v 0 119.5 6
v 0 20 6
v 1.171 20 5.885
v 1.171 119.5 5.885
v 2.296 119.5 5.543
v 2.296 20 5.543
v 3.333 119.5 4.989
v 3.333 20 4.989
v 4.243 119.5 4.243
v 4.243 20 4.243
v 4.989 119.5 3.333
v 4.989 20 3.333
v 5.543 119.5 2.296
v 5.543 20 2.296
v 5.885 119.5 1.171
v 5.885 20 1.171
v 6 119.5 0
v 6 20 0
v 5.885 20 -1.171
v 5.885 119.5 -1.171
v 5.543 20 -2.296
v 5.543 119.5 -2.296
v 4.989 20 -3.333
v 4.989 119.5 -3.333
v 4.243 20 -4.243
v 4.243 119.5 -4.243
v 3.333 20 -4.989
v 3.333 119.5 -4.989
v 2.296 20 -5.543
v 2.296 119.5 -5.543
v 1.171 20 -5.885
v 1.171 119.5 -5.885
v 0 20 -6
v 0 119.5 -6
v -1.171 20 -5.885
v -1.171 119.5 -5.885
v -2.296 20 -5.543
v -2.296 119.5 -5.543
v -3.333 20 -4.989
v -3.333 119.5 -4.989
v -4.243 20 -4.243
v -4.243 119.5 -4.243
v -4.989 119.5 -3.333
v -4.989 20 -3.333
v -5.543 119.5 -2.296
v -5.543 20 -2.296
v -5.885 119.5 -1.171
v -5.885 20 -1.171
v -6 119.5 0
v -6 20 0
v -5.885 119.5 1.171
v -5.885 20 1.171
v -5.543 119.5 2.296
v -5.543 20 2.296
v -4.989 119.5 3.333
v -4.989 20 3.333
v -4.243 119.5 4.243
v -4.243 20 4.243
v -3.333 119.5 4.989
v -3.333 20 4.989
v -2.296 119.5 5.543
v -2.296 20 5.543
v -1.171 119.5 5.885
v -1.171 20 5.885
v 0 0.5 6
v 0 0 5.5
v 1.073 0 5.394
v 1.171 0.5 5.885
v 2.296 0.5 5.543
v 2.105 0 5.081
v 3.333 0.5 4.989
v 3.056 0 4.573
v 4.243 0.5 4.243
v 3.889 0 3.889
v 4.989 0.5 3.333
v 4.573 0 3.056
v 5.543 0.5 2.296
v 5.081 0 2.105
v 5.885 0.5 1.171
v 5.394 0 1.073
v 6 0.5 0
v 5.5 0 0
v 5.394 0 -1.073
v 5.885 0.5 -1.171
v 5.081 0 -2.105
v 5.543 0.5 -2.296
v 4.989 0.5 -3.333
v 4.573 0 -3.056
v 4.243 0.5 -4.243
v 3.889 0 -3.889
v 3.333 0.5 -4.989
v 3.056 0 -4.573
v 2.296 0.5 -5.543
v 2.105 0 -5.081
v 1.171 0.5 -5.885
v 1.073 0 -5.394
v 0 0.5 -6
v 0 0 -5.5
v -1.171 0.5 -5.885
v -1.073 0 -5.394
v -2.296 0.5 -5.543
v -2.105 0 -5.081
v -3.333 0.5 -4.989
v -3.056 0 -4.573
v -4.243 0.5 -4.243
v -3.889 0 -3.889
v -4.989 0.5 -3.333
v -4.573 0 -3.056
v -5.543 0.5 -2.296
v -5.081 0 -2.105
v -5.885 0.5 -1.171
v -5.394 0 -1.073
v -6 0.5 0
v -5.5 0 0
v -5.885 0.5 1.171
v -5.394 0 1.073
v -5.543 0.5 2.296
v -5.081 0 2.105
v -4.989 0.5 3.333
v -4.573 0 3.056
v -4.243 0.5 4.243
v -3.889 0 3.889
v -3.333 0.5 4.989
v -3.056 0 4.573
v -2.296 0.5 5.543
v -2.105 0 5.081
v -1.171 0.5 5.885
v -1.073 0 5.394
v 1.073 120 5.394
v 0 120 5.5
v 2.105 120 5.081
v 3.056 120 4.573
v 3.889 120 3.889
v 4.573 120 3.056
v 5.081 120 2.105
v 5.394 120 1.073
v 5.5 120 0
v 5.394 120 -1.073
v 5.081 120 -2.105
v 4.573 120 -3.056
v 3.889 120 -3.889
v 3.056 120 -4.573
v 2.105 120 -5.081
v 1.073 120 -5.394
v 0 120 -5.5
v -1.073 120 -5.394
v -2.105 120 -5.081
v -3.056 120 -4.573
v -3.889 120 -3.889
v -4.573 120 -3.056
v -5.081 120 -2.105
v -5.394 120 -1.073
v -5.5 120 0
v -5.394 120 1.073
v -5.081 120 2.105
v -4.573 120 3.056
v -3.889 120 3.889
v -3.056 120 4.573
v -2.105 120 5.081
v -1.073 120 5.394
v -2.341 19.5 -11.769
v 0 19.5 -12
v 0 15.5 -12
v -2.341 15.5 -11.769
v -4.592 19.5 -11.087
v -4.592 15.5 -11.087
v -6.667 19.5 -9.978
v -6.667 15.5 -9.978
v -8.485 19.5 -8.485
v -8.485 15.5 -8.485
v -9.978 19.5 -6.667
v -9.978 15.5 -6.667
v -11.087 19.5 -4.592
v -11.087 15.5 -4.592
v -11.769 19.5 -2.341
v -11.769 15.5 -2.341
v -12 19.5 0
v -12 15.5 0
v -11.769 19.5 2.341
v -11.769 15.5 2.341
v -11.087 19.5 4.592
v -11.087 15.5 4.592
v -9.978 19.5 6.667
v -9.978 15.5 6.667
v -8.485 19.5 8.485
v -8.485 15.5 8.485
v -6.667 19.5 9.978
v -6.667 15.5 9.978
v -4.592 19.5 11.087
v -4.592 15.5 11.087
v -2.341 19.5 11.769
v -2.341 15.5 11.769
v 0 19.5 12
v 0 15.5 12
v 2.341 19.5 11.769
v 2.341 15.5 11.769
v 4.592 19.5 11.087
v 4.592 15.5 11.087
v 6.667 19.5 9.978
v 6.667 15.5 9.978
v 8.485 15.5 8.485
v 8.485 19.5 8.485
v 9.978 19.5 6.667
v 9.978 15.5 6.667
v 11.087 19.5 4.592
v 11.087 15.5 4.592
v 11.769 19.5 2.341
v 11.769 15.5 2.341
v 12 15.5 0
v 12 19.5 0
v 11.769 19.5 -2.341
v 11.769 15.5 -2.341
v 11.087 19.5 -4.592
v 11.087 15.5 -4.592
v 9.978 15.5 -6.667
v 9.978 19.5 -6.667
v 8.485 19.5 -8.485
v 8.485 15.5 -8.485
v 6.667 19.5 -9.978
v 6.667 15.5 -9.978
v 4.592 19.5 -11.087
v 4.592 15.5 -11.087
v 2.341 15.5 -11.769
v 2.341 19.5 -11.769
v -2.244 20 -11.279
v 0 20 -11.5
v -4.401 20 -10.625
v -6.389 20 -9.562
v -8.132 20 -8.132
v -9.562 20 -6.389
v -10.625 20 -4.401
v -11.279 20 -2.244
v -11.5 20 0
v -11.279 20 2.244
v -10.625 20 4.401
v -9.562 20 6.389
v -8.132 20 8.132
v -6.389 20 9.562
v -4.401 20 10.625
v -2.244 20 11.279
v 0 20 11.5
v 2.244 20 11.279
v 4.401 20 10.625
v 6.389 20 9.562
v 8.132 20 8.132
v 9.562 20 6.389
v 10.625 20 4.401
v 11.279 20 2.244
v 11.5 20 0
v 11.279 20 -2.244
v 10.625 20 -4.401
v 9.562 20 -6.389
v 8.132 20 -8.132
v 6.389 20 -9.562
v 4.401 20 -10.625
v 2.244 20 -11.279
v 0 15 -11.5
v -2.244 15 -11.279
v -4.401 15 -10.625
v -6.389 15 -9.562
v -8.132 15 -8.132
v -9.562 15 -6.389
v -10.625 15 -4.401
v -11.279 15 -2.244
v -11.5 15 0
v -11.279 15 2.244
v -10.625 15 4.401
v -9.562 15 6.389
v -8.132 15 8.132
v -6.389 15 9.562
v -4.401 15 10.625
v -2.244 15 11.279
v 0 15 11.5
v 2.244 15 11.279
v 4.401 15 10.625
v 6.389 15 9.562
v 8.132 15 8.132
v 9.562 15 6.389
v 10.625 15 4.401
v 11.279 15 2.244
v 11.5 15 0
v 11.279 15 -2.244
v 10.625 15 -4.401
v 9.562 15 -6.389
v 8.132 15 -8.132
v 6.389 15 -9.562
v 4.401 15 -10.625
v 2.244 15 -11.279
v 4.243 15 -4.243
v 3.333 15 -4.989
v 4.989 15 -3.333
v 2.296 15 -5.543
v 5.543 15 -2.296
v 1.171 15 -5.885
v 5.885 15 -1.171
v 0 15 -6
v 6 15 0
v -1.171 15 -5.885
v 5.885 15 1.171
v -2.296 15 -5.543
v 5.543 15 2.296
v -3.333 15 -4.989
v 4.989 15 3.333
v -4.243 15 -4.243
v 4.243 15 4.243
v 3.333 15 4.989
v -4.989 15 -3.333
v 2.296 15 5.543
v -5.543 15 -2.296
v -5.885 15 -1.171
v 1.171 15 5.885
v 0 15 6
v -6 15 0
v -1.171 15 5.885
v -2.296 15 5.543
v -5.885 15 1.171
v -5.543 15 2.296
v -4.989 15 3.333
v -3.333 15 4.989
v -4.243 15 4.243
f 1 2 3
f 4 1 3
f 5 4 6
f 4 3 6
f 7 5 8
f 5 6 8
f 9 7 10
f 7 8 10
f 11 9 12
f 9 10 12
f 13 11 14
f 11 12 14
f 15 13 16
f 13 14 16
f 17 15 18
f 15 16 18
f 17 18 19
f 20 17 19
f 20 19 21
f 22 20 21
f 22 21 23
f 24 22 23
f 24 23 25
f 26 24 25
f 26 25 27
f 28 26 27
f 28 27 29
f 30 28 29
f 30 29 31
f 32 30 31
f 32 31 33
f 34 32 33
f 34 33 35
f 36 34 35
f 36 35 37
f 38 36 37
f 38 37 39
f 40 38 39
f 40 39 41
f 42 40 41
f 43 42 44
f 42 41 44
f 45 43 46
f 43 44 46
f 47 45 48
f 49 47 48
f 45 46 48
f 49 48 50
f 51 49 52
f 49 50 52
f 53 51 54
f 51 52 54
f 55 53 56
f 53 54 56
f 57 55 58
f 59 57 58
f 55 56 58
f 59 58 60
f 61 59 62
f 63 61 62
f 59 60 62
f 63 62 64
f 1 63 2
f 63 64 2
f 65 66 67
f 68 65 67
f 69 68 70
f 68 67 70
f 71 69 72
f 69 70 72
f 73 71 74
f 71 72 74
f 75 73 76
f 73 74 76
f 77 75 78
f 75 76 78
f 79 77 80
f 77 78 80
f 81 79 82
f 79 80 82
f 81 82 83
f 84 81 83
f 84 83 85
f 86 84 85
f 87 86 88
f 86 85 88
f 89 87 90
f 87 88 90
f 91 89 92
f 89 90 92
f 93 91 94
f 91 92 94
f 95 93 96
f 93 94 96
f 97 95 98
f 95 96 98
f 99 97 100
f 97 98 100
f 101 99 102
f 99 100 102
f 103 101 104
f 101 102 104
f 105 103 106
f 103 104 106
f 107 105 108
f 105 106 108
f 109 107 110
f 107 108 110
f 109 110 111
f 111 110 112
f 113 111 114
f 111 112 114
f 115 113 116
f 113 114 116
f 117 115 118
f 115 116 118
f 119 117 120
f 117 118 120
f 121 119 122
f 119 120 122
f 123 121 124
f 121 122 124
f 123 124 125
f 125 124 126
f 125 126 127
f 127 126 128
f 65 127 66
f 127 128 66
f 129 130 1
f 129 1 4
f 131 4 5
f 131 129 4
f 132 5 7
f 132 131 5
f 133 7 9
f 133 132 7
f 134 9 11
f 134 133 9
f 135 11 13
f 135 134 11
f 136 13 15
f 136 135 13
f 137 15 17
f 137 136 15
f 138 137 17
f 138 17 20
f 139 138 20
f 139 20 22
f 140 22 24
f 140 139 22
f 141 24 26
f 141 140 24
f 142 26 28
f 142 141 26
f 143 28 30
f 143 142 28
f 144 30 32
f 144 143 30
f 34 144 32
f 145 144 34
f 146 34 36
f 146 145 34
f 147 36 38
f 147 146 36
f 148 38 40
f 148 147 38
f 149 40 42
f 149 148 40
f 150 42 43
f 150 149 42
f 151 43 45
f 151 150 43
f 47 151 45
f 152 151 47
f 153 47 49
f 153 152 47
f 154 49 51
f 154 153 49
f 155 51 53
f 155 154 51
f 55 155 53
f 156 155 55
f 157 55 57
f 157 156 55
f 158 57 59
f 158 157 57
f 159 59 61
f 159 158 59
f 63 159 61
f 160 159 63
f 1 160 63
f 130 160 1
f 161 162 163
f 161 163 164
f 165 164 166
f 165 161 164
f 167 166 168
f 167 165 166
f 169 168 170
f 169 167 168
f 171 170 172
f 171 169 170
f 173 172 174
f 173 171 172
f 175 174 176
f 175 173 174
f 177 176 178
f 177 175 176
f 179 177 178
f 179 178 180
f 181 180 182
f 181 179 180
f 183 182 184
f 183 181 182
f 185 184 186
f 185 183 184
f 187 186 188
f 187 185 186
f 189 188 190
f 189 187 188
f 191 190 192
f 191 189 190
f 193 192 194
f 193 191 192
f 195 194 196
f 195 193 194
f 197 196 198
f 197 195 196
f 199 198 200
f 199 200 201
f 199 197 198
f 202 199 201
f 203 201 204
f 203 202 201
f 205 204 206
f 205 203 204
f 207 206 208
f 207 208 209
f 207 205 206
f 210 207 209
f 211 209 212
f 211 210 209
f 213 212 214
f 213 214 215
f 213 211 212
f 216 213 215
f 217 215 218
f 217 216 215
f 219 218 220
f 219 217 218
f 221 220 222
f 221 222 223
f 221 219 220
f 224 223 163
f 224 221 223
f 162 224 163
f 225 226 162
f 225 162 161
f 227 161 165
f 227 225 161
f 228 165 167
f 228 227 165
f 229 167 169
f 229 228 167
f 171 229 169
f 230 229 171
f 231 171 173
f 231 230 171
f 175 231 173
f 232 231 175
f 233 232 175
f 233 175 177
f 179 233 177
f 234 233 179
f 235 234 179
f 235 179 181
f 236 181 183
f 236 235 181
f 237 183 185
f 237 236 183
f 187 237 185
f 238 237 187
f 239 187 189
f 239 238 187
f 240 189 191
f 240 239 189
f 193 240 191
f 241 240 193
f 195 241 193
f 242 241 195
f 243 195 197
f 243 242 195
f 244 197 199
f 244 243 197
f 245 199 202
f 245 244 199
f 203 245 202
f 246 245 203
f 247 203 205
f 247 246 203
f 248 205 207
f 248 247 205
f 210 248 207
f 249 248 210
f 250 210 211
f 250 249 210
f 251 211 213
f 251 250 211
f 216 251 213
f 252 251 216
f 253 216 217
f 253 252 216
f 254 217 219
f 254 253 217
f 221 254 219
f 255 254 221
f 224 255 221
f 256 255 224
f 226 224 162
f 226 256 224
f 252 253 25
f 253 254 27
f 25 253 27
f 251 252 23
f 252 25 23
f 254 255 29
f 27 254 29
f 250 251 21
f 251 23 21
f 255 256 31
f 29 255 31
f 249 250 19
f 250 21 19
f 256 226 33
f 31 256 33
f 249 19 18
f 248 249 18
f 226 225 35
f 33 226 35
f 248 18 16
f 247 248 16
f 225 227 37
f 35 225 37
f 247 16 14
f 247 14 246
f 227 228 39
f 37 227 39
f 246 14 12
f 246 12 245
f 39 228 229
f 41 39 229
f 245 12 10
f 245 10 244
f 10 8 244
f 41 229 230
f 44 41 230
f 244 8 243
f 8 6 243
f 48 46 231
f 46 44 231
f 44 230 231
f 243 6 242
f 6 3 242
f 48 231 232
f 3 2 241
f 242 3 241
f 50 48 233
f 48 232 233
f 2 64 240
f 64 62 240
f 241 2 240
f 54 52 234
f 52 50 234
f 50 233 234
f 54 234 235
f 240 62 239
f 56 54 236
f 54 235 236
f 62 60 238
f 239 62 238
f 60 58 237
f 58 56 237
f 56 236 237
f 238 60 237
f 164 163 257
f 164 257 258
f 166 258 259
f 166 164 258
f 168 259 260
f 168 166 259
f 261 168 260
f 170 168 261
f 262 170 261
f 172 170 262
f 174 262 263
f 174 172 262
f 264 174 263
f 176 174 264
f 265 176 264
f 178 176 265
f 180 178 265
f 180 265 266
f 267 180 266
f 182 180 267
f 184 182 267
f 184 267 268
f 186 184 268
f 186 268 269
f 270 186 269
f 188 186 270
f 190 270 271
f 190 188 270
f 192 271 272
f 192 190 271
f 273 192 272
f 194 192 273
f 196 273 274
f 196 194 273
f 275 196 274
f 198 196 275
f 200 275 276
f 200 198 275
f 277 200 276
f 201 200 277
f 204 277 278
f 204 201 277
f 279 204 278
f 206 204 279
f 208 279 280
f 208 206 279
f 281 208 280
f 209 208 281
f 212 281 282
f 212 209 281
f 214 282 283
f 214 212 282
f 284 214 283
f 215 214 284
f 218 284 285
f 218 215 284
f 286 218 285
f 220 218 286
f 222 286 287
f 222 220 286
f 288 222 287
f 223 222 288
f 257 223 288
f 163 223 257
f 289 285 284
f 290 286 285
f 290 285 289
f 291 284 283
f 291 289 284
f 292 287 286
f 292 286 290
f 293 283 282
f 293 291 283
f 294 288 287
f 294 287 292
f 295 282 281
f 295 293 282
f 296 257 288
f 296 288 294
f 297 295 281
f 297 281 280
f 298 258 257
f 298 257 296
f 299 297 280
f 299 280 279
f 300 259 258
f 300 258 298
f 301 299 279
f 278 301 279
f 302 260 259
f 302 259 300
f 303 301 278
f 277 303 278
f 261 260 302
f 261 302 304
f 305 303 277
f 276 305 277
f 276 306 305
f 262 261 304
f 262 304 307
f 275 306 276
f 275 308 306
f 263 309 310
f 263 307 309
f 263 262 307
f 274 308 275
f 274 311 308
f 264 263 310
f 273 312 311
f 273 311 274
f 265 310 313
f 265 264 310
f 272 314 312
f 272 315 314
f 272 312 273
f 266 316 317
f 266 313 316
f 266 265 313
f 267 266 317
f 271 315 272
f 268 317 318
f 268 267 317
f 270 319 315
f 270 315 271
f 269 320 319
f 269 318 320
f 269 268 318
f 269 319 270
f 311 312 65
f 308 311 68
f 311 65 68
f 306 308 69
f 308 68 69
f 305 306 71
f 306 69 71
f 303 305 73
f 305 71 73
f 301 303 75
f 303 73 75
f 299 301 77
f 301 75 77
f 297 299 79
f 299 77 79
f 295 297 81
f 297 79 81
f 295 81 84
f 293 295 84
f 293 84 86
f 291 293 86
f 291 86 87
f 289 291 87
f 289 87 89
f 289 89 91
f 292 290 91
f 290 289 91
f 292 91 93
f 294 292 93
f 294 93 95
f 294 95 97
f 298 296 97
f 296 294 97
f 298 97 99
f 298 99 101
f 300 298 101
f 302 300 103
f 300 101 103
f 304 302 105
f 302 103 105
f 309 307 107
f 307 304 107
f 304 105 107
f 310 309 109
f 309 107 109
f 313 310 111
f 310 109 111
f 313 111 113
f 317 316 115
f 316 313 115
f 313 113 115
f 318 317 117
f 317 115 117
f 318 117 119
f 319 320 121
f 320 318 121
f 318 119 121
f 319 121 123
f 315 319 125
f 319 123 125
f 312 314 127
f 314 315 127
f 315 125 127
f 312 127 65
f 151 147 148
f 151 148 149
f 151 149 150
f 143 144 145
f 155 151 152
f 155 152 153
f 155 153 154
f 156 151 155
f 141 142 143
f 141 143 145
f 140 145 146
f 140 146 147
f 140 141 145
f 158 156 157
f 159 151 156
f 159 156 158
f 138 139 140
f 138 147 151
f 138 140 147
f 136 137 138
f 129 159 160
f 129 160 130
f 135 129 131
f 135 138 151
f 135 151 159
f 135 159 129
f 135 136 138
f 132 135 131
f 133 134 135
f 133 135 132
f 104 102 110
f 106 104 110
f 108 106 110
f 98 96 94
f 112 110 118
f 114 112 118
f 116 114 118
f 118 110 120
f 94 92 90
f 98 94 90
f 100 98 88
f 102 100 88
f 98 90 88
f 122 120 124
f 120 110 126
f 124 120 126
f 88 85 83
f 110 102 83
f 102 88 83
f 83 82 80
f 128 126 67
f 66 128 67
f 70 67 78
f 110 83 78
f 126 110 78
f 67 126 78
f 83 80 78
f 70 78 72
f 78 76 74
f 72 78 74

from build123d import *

# Parameters (mm, degrees)
SKETCH_1_R      = 6
EXTRUDE_1_DEPTH = 120
SKETCH_2_W      = 12
SKETCH_2_H      = 5
CHAMFER_1_SIZE  = 0.5


with BuildPart() as part:
    # 草图1 → 凸台-拉伸1 (new body)
    with BuildSketch(Plane(origin=(0, 0, 0), x_dir=(1, 0, 0), z_dir=(0, 1, 0))):
        with Locations(Location((0, 0, 0), (0, 0, 270))):
            Circle(SKETCH_1_R)
    extrude(amount=EXTRUDE_1_DEPTH)

    # 草图2 → 旋转1 (revolve)
    with BuildSketch(Plane(origin=(0, 0, 0), x_dir=(0, 0, -1), z_dir=(1, 0, 0))):
        with Locations((6, 17.5)):
            Rectangle(SKETCH_2_W, SKETCH_2_H)
    revolve(axis=Axis((0, 0, 0), (0, 1, 0)))

    # 倒角1
    chamfer_1_edges = [part.edges().sort_by_distance(p)[0] for p in [
        (0, 0, -6),
        (0, 120, -6),
        (0, 20, 12),
        (0, 15, 12),
    ]]
    chamfer(chamfer_1_edges, length=CHAMFER_1_SIZE)


solid = part.part
